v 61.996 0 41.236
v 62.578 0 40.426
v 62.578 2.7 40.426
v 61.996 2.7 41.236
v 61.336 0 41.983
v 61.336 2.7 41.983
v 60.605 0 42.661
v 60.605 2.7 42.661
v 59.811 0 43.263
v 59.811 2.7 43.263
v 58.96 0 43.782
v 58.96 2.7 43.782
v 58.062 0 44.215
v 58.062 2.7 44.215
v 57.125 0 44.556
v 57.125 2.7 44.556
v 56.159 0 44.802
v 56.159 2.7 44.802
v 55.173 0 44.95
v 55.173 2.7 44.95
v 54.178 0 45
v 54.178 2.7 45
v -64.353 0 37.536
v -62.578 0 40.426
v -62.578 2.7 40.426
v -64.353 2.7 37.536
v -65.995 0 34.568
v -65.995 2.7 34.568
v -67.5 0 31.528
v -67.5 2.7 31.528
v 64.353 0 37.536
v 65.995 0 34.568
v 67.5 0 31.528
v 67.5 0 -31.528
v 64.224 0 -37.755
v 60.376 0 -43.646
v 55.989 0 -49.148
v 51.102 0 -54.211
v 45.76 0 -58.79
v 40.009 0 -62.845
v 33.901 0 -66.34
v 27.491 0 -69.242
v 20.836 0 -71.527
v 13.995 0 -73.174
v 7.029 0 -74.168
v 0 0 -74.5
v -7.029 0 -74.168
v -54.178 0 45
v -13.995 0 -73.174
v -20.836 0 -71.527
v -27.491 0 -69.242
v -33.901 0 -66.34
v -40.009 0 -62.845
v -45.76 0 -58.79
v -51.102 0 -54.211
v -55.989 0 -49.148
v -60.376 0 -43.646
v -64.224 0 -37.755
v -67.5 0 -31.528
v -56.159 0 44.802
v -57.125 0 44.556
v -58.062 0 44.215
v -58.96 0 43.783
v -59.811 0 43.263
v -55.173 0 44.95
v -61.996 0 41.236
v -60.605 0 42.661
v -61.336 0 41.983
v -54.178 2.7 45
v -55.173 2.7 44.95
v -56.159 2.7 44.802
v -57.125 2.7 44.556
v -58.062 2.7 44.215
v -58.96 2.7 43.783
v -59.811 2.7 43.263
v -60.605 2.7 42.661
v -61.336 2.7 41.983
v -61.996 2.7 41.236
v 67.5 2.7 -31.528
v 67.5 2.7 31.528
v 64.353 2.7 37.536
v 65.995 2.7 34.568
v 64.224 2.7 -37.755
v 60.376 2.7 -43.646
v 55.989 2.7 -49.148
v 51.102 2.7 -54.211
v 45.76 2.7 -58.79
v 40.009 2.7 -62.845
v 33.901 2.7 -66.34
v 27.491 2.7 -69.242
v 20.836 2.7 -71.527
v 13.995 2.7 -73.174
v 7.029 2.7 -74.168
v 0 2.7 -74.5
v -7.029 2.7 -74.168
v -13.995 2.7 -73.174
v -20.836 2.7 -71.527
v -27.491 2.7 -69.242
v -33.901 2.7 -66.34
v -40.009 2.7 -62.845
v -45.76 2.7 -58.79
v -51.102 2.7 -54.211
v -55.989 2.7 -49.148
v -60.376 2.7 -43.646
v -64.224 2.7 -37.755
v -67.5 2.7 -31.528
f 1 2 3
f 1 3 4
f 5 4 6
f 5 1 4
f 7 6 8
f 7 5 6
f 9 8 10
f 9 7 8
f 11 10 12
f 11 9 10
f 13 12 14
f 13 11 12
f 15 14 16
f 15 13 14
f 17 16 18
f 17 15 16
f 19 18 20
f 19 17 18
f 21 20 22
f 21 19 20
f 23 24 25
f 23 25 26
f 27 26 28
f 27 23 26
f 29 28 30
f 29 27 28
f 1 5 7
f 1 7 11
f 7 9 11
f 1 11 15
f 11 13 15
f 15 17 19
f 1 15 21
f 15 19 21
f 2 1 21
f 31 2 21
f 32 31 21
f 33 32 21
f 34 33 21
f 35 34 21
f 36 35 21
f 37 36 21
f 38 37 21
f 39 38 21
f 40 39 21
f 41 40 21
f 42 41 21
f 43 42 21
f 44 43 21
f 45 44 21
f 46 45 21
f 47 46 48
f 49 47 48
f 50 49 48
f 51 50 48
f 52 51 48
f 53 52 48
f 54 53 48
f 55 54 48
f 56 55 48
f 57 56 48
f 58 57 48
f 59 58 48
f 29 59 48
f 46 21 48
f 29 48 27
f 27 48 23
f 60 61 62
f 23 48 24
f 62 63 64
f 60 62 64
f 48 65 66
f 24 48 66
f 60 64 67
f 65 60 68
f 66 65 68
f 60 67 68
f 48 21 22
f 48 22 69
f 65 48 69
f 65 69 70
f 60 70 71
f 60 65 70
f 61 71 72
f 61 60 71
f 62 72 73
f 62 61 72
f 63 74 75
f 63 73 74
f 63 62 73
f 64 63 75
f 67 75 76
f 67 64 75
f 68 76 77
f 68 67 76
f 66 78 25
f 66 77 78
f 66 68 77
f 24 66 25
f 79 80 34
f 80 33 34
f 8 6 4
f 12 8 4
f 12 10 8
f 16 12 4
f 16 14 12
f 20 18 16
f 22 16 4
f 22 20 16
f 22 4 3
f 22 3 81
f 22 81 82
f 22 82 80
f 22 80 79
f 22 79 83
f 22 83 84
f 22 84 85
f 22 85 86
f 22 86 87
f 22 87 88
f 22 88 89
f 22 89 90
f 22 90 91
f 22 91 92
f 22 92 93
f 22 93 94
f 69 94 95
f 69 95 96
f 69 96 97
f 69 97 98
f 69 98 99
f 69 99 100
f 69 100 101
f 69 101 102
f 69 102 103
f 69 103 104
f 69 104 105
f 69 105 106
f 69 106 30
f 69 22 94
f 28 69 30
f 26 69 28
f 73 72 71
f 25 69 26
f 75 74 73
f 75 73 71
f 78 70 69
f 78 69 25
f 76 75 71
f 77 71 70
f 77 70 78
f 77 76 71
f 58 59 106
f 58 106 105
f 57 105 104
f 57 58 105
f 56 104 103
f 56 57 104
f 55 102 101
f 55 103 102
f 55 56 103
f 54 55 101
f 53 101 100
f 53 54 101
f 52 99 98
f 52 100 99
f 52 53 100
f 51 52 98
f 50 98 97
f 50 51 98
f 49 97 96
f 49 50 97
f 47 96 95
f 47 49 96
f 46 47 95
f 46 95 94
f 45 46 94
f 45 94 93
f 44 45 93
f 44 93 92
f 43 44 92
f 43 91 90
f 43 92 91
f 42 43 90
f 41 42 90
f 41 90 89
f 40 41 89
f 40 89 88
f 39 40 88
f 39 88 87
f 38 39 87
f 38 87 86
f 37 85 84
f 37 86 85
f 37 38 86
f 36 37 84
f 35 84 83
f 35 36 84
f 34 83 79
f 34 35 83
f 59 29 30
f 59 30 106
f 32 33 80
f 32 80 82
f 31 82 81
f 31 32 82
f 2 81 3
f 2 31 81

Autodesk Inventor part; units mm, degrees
ref_plane "YZ Plane" through (0, 0, 0) normal (1, 0, 0) x (0, 1, 0)
ref_plane "XZ Plane" through (0, 0, 0) normal (0, 1, 0) x (-1, 0, 0)
ref_plane "XY Plane" through (0, 0, 0) normal (0, 0, 1) x (1, 0, 0)
sketch "Sketch3" plane through (0, 0, 0) normal (0, 1, 0) x (-1, 0, 0)
  line L0 (0, 0) -> (67.5, 0)
  line L1 (0, 0) -> (0, 45)
  line L2 (67.5, 31.5278) -> (67.5, -31.5278)
  line L3 (0, 45) -> (54.1779, 45)
  line L4 (-67.5, 31.5278) -> (-67.5, -31.5278)
  line L5 (0, 45) -> (-54.1779, 45)
  arc A0 (67.5, 31.5278) -> (62.5776, 40.4264) centre (0, 0) ccw
  arc A1 (-62.5776, 40.4264) -> (-67.5, 31.5278) centre (0, 0) ccw
  arc A2 (-67.5, -31.5278) -> (67.5, -31.5278) centre (0, 0) ccw
  arc A3 (62.5776, 40.4264) -> (54.1779, 45) centre (54.1779, 35) ccw
  arc A4 (-54.1779, 45) -> (-62.5776, 40.4264) centre (-54.1779, 35) ccw
  point P0 (59.3738, 45)
  point P1 (-59.3738, 45)
  dimension "d28" = 67.5
  dimension "d29" = 45
  dimension "d30" = 10
  dimension "d31" = 10
  dimension "d32" = 74.5
  dimension "d34" = 67.5
  dimension "d35" = 74.5
extrude "Extrusion2" add sketch "Sketch3" along normal blind 2.7
properties part number "tapa_carcasa_4.0"
